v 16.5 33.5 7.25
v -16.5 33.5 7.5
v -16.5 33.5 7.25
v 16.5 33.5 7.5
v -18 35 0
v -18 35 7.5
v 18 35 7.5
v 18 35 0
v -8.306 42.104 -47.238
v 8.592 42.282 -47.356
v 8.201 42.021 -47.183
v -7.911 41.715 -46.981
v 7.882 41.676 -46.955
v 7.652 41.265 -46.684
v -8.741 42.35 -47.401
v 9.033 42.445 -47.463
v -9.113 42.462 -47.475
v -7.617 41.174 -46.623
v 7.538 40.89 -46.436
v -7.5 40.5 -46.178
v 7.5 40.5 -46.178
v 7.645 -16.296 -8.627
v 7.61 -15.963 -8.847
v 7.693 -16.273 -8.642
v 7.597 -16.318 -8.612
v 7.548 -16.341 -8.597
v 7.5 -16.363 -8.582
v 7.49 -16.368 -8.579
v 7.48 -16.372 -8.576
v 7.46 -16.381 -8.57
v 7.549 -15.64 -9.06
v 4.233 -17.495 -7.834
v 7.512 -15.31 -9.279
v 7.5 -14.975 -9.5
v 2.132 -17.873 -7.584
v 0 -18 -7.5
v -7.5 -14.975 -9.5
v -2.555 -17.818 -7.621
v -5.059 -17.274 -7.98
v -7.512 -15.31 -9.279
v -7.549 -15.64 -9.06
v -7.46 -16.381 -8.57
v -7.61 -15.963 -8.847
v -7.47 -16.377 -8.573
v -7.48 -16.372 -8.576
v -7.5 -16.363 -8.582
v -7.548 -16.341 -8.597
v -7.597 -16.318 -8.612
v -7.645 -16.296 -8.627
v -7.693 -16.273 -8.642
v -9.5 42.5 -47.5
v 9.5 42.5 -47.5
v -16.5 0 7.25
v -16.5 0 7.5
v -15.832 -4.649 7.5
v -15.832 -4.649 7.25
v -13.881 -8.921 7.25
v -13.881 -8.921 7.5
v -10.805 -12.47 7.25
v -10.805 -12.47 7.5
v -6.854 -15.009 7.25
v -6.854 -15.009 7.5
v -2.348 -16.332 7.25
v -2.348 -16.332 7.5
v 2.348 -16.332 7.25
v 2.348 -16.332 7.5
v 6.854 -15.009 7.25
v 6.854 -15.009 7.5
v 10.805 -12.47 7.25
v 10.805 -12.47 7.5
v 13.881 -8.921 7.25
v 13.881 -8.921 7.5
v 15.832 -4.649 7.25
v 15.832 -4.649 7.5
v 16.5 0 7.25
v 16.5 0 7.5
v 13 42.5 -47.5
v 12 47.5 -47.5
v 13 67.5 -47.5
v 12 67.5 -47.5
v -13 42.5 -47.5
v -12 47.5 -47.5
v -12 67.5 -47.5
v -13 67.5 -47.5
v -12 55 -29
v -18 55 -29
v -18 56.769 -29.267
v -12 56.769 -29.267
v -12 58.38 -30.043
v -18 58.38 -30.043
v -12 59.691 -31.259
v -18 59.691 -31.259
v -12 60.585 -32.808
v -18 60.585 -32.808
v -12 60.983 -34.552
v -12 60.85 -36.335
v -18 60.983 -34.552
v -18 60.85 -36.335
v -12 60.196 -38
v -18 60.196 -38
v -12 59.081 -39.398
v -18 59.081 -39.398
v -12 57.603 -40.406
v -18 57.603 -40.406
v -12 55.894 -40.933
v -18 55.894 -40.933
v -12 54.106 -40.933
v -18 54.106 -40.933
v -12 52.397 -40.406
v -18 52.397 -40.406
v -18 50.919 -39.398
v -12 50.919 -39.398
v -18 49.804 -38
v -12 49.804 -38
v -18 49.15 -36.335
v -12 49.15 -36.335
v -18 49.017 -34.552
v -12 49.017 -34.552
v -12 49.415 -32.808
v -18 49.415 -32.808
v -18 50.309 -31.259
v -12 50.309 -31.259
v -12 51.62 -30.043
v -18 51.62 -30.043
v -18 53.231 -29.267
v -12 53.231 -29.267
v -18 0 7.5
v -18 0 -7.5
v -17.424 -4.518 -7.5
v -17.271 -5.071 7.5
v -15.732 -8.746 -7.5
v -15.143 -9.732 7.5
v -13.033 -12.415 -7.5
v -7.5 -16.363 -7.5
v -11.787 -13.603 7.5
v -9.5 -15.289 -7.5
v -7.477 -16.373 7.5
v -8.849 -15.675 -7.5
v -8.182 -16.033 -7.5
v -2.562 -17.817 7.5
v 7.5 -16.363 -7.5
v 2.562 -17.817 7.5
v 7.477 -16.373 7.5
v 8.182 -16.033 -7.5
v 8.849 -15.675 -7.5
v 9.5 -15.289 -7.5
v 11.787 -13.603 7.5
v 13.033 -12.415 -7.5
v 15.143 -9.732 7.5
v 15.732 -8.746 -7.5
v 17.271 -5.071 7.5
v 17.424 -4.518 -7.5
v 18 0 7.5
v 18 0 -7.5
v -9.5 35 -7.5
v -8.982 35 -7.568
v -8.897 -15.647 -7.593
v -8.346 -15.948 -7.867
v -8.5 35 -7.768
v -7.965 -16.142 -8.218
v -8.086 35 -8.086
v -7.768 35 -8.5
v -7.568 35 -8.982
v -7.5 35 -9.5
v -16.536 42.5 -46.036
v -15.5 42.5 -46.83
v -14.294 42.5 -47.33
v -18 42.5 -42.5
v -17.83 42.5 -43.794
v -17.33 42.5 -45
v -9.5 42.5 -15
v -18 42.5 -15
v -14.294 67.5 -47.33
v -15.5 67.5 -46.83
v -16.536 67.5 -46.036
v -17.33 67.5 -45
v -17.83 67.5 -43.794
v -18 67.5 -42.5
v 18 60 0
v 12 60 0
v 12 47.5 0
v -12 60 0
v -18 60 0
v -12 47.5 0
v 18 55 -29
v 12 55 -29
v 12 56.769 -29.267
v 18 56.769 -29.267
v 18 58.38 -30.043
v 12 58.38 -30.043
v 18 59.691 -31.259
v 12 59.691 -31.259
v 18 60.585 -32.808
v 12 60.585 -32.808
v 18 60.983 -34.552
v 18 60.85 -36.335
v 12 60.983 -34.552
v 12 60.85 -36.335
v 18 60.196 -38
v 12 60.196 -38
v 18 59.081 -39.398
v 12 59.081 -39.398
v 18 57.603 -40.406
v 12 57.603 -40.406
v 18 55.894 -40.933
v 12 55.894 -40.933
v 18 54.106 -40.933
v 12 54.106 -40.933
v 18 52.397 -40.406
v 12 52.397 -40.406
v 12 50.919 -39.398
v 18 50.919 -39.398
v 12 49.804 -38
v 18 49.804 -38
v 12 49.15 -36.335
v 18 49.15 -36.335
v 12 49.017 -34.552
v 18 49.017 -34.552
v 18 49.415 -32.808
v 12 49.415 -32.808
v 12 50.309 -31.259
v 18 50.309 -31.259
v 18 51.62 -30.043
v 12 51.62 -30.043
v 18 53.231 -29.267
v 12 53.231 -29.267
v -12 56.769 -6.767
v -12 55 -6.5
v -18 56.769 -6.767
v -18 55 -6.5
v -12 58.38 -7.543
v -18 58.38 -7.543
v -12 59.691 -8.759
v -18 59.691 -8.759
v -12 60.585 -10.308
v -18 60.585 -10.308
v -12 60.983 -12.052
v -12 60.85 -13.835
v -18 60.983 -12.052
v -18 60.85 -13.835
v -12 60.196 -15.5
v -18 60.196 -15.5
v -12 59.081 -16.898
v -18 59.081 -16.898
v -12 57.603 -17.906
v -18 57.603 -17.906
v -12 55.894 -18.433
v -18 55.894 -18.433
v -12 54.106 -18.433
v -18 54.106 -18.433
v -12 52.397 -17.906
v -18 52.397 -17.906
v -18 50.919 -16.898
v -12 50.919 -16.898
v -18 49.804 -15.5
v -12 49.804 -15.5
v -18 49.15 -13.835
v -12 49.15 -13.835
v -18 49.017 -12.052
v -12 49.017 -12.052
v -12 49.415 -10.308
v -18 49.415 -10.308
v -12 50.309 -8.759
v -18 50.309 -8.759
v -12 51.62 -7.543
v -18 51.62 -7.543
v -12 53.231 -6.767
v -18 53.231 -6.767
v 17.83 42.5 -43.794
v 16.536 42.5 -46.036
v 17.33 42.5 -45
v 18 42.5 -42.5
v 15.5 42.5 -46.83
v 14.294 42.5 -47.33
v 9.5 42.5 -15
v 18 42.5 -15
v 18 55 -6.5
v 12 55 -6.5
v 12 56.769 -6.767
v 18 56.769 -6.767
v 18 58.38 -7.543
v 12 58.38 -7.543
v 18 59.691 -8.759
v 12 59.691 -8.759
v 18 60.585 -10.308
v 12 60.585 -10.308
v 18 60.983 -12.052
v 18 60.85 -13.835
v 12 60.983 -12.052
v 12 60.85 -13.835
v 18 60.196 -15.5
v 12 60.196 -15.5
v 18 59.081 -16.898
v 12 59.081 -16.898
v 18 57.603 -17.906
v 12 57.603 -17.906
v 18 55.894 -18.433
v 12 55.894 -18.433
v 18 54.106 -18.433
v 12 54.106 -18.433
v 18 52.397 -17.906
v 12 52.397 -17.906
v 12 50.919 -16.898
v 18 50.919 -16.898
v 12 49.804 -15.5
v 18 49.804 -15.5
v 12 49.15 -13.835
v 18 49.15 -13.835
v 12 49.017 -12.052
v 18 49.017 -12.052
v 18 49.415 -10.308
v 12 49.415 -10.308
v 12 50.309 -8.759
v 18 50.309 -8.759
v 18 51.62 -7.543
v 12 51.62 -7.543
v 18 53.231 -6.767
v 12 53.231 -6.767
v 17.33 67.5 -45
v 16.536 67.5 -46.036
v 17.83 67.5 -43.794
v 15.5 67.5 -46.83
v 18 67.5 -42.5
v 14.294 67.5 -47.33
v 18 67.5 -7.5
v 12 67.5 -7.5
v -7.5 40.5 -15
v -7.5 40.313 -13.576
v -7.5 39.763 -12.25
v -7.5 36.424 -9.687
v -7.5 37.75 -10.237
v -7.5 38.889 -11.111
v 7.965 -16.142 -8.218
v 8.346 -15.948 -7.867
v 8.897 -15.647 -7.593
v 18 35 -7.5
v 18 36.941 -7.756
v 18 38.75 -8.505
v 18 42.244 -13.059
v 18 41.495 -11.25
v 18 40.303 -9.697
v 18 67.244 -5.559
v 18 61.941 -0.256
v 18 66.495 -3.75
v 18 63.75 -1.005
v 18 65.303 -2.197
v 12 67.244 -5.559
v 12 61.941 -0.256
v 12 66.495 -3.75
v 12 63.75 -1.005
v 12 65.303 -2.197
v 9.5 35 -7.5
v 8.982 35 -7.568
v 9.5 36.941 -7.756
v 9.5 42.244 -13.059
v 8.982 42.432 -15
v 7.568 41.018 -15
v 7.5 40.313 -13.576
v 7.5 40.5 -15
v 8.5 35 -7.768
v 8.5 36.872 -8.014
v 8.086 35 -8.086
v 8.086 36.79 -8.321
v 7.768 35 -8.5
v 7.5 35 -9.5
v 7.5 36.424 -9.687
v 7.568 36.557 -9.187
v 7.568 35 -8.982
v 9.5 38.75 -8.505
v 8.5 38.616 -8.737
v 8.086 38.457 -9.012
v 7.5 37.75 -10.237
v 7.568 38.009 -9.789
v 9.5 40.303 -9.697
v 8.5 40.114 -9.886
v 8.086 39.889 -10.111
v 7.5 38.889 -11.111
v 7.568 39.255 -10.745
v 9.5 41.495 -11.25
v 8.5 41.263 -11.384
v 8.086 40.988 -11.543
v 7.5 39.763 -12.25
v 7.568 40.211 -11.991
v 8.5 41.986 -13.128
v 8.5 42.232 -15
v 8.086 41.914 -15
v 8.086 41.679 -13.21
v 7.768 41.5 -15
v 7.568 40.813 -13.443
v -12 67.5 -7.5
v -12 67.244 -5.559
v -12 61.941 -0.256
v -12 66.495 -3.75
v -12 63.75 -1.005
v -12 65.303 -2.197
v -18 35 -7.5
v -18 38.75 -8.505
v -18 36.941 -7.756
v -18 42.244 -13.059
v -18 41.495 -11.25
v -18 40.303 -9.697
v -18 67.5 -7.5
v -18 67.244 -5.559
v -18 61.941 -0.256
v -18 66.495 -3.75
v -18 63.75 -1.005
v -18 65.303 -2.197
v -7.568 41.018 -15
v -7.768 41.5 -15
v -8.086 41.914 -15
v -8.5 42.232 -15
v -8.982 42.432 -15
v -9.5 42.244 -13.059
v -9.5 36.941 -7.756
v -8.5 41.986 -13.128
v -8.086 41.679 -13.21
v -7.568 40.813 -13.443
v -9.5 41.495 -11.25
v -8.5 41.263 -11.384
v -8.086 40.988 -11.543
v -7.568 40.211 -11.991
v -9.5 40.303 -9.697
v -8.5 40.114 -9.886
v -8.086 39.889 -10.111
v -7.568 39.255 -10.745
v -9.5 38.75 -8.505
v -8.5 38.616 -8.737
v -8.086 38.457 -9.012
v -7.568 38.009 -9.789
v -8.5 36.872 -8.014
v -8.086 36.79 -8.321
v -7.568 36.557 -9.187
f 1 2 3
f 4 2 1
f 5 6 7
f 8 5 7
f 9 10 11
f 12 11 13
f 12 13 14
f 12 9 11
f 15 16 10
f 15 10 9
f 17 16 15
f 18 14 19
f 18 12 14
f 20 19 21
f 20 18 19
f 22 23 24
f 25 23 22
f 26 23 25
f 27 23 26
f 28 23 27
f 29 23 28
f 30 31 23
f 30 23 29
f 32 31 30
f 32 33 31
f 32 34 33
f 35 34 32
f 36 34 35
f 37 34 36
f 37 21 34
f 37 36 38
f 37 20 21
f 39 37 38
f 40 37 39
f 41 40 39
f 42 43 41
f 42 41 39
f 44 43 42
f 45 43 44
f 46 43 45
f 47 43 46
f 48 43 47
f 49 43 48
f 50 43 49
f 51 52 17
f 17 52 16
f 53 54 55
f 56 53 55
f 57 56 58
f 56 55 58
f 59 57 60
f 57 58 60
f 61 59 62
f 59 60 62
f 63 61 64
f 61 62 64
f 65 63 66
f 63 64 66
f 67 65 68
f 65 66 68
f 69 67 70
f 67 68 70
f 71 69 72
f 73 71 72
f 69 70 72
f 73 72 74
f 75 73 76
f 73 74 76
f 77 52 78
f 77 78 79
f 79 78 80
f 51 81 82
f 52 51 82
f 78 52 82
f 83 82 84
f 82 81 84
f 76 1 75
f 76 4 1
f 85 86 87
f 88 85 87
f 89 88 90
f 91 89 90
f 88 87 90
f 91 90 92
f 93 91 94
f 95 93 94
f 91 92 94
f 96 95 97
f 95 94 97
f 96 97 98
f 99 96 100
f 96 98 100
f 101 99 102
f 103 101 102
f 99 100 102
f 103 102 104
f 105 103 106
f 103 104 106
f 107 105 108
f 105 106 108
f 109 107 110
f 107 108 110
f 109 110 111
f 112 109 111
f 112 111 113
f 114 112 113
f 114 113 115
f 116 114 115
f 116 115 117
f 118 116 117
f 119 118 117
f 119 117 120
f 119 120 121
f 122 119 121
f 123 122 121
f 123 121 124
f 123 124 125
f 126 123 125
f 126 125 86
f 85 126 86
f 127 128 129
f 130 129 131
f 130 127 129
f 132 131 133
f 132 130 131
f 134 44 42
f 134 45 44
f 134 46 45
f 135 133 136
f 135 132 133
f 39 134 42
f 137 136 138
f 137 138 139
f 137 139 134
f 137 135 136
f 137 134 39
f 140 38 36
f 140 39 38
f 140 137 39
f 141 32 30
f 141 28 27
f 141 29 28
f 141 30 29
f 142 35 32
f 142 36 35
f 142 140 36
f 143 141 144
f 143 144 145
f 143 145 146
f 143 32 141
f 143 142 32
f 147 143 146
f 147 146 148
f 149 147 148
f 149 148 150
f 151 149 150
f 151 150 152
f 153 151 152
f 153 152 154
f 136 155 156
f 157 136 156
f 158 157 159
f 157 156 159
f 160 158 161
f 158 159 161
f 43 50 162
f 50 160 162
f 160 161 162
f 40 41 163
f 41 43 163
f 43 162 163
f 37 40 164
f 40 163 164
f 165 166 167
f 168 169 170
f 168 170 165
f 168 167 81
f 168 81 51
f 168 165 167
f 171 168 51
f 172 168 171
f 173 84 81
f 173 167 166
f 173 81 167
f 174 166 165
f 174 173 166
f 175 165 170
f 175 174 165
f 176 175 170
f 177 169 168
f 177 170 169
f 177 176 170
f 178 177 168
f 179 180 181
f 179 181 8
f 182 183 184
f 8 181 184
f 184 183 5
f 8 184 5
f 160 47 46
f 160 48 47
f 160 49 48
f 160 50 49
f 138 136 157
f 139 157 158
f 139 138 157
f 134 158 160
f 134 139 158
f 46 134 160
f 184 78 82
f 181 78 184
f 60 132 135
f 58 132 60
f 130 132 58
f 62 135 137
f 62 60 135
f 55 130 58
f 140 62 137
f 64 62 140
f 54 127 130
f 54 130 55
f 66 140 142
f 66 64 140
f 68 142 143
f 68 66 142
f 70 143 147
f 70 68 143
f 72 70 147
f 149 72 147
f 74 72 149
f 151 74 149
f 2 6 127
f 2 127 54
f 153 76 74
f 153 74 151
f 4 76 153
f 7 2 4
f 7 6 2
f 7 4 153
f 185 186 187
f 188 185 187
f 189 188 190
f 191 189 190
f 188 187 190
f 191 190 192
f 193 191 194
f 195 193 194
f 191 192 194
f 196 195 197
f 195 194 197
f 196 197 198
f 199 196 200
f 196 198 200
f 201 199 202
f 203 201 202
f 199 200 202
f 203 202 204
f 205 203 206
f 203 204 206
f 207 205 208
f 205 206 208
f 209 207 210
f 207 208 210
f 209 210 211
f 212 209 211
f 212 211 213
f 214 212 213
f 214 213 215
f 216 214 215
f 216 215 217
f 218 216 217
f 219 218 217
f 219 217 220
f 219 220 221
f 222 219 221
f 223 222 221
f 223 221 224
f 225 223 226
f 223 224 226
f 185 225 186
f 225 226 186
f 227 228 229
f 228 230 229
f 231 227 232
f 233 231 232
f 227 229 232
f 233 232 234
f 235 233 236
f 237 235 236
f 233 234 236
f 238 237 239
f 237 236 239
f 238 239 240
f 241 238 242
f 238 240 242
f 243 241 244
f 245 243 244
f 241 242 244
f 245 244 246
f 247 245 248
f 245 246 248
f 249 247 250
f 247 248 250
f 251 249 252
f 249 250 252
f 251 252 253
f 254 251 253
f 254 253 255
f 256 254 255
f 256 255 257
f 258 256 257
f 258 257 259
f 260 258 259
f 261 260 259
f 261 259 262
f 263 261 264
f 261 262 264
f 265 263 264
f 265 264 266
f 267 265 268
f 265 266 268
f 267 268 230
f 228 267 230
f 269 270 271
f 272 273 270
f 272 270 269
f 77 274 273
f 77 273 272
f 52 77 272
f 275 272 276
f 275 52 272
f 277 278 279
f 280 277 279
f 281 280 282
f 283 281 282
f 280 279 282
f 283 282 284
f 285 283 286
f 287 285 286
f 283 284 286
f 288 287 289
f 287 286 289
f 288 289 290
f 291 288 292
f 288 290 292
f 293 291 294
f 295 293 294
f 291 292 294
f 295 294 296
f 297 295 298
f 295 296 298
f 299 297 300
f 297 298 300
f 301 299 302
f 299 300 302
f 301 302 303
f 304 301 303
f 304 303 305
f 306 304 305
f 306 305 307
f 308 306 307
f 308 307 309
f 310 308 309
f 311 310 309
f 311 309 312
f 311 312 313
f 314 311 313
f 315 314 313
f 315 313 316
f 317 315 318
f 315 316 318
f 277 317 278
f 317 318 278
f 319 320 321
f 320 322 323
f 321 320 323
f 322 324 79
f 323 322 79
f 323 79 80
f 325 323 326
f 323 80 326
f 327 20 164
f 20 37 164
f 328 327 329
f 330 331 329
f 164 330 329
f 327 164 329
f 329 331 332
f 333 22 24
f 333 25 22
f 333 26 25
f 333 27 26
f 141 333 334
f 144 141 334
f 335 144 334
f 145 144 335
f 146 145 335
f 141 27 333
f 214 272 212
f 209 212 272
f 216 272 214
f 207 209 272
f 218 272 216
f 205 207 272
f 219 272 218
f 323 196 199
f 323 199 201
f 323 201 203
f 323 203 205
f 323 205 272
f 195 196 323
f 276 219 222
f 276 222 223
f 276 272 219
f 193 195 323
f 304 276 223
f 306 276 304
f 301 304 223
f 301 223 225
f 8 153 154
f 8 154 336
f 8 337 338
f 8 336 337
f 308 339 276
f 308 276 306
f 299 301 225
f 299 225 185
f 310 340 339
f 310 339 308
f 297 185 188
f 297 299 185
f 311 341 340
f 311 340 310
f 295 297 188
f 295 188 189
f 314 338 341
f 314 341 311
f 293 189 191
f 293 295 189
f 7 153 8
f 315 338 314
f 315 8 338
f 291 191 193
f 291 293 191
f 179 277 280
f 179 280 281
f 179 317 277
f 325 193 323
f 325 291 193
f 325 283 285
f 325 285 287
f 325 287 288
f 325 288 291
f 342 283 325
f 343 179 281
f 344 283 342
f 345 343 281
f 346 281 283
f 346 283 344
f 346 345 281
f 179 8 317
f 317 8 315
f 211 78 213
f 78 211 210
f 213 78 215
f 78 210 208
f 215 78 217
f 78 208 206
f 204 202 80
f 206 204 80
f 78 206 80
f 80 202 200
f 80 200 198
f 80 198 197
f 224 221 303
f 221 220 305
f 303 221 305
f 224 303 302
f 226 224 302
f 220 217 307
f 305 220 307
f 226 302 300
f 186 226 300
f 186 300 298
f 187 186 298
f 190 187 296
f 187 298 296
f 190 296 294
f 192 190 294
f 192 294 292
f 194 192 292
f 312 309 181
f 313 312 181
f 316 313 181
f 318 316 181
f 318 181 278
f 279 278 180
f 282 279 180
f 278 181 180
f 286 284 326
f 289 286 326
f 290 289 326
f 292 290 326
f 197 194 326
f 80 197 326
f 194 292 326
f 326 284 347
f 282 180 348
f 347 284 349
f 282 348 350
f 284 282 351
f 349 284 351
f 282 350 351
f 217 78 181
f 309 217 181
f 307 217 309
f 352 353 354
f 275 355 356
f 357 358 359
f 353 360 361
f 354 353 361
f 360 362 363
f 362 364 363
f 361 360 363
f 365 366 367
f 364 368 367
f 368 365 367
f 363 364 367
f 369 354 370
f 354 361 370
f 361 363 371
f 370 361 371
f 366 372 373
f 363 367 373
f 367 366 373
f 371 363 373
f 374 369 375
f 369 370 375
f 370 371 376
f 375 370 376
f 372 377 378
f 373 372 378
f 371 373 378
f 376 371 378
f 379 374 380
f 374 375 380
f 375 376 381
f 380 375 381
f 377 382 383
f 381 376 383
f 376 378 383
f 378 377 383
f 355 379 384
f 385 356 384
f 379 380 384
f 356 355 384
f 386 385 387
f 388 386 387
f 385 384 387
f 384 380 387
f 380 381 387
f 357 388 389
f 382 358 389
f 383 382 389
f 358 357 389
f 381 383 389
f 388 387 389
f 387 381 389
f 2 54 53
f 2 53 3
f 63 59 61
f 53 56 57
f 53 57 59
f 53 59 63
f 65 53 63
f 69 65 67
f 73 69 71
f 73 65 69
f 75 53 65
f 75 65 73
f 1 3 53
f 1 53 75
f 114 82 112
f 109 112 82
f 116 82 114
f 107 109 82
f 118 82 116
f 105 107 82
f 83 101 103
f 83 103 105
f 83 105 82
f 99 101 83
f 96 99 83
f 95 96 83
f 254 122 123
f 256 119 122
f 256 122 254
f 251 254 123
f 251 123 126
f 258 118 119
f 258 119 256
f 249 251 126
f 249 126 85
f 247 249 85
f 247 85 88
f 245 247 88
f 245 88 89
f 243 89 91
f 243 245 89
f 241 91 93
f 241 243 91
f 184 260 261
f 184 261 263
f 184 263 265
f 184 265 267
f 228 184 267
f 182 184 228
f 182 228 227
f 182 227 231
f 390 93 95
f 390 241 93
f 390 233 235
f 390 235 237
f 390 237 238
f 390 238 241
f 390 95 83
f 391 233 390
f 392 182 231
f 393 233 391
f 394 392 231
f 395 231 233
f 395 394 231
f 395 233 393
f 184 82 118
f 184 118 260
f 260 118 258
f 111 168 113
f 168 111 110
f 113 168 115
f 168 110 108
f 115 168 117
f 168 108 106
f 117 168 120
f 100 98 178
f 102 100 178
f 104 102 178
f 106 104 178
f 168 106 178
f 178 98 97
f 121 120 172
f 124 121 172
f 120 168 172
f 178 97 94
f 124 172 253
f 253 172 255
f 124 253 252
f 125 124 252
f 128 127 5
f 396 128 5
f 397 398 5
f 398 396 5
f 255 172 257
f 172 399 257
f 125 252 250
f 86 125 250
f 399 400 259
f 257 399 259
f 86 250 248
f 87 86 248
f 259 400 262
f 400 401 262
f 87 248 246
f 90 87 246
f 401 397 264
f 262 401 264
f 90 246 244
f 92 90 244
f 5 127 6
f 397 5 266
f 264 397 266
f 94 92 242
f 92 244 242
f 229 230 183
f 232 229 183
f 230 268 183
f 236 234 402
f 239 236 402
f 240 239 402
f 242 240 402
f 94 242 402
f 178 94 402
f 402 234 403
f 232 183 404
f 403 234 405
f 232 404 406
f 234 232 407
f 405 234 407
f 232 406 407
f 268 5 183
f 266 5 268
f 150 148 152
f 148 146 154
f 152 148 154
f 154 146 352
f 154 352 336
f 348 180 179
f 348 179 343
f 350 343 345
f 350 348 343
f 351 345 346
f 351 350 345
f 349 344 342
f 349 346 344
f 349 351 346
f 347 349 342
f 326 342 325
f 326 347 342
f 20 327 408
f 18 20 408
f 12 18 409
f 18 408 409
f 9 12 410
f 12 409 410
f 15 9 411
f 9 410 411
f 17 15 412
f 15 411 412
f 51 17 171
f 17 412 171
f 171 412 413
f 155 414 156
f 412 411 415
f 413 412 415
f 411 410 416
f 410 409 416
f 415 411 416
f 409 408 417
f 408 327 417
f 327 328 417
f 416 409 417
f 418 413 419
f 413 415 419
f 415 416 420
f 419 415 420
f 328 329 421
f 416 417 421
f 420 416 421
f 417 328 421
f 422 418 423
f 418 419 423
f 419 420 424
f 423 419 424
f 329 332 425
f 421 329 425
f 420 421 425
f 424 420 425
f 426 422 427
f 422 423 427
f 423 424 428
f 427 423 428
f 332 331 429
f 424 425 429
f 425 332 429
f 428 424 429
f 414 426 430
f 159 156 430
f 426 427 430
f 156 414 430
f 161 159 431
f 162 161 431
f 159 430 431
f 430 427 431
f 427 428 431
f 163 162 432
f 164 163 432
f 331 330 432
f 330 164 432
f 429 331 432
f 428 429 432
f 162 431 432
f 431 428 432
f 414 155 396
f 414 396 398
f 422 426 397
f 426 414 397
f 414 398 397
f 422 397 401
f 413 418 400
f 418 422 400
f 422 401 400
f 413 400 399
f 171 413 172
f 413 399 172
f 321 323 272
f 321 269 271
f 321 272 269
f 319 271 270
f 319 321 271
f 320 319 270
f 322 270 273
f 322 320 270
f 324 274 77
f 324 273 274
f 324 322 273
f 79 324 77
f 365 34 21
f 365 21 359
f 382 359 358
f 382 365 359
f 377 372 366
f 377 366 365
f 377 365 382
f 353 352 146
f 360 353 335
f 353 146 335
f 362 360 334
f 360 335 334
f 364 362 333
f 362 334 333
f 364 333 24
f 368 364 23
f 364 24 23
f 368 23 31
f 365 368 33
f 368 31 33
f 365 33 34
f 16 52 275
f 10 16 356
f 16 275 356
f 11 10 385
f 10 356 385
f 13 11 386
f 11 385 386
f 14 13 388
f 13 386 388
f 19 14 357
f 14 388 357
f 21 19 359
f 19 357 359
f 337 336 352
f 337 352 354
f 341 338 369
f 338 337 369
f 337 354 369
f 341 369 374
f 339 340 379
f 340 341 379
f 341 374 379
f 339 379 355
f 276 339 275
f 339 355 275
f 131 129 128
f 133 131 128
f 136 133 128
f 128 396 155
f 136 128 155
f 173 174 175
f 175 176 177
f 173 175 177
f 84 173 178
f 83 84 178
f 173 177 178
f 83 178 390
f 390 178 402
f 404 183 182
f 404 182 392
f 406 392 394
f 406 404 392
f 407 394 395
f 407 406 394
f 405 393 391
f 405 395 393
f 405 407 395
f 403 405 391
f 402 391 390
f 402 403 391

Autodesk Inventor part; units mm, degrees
ref_plane "YZ Plane" through (0, 0, 0) normal (1, 0, 0) x (0, 1, 0)
ref_plane "XZ Plane" through (0, 0, 0) normal (0, 1, 0) x (-1, 0, 0)
ref_plane "XY Plane" through (0, 0, 0) normal (0, 0, 1) x (1, 0, 0)
sketch "Sketch1" plane through (0, 0, 0) normal (0, 0, 1) x (1, 0, 0)
  arc A0 (-18, 0) -> (18, 0) centre (0, 0) ccw
  line L0 (-18, 0) -> (-18, 35)
  line L1 (18, 0) -> (18, 35)
  line L2 (-18, 35) -> (18, 35)
  dimension "d0" = 36
  dimension "d2" = 35
extrude "Extrusion1" add sketch "Sketch1" against normal mid plane 15
sketch "Sketch2" plane through (0, 0, 0) normal (1, 0, 0) x (0, 1, 0)
  line L0 (35, -7.5) -> (0, -7.5) projected
  line L1 (35, -7.5) -> (35, 7.5) projected
  arc A0 (42.5, -15) -> (35, -7.5) centre (35, -15) ccw
  line L2 (42.5, -47.5) -> (42.5, -15)
  line L3 (42.5, -47.5) -> (67.5, -47.5)
  line L4 (67.5, -47.5) -> (67.5, -7.5)
  line L5 (60, 0) -> (35, 0)
  arc A1 (67.5, -7.5) -> (60, 0) centre (60, -7.5) ccw
  point P0 (0, 0)
  dimension "d10" = 40
  dimension "d11" = 25
  dimension "d12" = 15
extrude "Extrusion2" add sketch "Sketch2" along normal mid plane 36
sketch "Sketch3" plane through (0, 0, 0) normal (1, 0, 0) x (0, 1, 0)
  line L0 (42.5, -47.5) -> (67.5, -47.5) projected
  line L1 (-18, -7.5) -> (0, -7.5) projected
  line L2 (42.5, -47.5) -> (-18, -7.5)
  line L3 (35, -7.5) -> (0, -7.5) projected
  arc A0 (42.5, -15) -> (35, -7.5) centre (35, -15) ccw projected
  line L4 (42.5, -15) -> (42.5, -47.5) projected
  point P0 (0, 0)
extrude "Extrusion3" add sketch "Sketch3" along normal mid plane 15
delete faces "Delete Face1" heal yes whole lump no faces at (-6.6957, -17.2098, -7.5) (6.6957, -17.2098, -7.5)
fillet "Fillet1" radius 2 6 edges at (-7.5, 40.3033, -9.6967) (-7.5, 42.5, -31.25) (-7.5, 9.3185, -7.5) (7.5, 42.5, -31.25) (7.5, 9.3185, -7.5) (7.5, 40.3033, -9.6967)
sketch "Sketch5" plane through (0, 0, 0) normal (1, 0, 0) x (0, 1, 0)
  line L0 (47.5, -54.8971) -> (47.5, 0)
  line L1 (67.5, -47.5) -> (67.5, -7.5) projected
  line L2 (0, -7.5) -> (0, 7.5) projected
  line L3 (35, -7.5) -> (0, -7.5) projected
  arc A0 (42.5, -15) -> (35, -7.5) centre (35, -15) ccw projected
  line L4 (42.5, -15) -> (42.5, -47.5) projected
  line L5 (42.5, -47.5) -> (67.5, -47.5) projected
  line L6 (67.5, -47.5) -> (67.5, -7.5) projected
  arc A1 (67.5, -7.5) -> (60, 0) centre (60, -7.5) ccw projected
  line L7 (60, 0) -> (35, 0) projected
  line L8 (35, 0) -> (35, 7.5) projected
  line L9 (0, 7.5) -> (35, 7.5) projected
  point P0 (0, 0)
  point P1 (47.5, -47.5)
  dimension "d21" = 20
extrude "Extrusion5" cut sketch "Sketch5" against normal mid plane 24 contours L0 L7 A1 L1 L5
sketch "Sketch6" plane through (0, 0, 7.5) normal (0, 0, 1) x (1, 0, 0)
  arc A0 (-18, 0) -> (18, 0) centre (0, 0) ccw projected
  line L0 (18, 0) -> (18, 35) projected
  line L1 (18, 35) -> (-18, 35) projected
  line L2 (-18, 35) -> (-18, 0) projected
  arc A1 (-16.5, 0) -> (16.5, 0) centre (0, 0) ccw
  line L3 (-16.5, 0) -> (-16.5, 33.5)
  line L4 (-16.5, 33.5) -> (16.5, 33.5)
  line L5 (16.5, 33.5) -> (16.5, 0)
  dimension "d24" = 1.5
extrude "Extrusion6" cut sketch "Sketch6" against normal blind 0.25 contours L3 L4 L5 A1
fillet "Fillet2" radius 5 2 edges at (-18, 55, -47.5) (18, 55, -47.5)
sketch "Sketch7" plane through (-18, 35, 0) normal (-1, 0, 0) x (0, 0, 1)
  line L0 (-42.5, 7.5) -> (-42.5, 32.5) projected
  line L1 (-42.5, 7.5) -> (-15, 7.5) projected
  arc A0 (-7.5, 0) -> (-15, 7.5) centre (-15, 0) ccw projected
  line L2 (-7.5, -35) -> (-7.5, 0) projected
  line L3 (7.5, -35) -> (-7.5, -35) projected
  line L4 (7.5, 0) -> (7.5, -35) projected
  line L5 (0, 0) -> (7.5, 0) projected
  line L6 (0, 0) -> (0, 25) projected
  arc A1 (0, 25) -> (-7.5, 32.5) centre (-7.5, 25) ccw projected
  line L7 (-7.5, 32.5) -> (-42.5, 32.5) projected
  circle A2 centre (-12.5, 20) radius 6
  line L8 (-47.5, 32.5) -> (-47.5, 7.5) projected
  circle A3 centre (-35, 20) radius 6
  point P0 (0, -35)
  point P1 (-47.5, 20)
  dimension "d28" = 25
  dimension "d29" = 12
  dimension "d30" = 47.5
  dimension "d31" = 12.5
  dimension "d32" = 12
  dimension "d33" = 12.5
extrude "Extrusion7" cut sketch "Sketch7" against normal through all contours A2 | A3
properties part number "Holder of gripper"
